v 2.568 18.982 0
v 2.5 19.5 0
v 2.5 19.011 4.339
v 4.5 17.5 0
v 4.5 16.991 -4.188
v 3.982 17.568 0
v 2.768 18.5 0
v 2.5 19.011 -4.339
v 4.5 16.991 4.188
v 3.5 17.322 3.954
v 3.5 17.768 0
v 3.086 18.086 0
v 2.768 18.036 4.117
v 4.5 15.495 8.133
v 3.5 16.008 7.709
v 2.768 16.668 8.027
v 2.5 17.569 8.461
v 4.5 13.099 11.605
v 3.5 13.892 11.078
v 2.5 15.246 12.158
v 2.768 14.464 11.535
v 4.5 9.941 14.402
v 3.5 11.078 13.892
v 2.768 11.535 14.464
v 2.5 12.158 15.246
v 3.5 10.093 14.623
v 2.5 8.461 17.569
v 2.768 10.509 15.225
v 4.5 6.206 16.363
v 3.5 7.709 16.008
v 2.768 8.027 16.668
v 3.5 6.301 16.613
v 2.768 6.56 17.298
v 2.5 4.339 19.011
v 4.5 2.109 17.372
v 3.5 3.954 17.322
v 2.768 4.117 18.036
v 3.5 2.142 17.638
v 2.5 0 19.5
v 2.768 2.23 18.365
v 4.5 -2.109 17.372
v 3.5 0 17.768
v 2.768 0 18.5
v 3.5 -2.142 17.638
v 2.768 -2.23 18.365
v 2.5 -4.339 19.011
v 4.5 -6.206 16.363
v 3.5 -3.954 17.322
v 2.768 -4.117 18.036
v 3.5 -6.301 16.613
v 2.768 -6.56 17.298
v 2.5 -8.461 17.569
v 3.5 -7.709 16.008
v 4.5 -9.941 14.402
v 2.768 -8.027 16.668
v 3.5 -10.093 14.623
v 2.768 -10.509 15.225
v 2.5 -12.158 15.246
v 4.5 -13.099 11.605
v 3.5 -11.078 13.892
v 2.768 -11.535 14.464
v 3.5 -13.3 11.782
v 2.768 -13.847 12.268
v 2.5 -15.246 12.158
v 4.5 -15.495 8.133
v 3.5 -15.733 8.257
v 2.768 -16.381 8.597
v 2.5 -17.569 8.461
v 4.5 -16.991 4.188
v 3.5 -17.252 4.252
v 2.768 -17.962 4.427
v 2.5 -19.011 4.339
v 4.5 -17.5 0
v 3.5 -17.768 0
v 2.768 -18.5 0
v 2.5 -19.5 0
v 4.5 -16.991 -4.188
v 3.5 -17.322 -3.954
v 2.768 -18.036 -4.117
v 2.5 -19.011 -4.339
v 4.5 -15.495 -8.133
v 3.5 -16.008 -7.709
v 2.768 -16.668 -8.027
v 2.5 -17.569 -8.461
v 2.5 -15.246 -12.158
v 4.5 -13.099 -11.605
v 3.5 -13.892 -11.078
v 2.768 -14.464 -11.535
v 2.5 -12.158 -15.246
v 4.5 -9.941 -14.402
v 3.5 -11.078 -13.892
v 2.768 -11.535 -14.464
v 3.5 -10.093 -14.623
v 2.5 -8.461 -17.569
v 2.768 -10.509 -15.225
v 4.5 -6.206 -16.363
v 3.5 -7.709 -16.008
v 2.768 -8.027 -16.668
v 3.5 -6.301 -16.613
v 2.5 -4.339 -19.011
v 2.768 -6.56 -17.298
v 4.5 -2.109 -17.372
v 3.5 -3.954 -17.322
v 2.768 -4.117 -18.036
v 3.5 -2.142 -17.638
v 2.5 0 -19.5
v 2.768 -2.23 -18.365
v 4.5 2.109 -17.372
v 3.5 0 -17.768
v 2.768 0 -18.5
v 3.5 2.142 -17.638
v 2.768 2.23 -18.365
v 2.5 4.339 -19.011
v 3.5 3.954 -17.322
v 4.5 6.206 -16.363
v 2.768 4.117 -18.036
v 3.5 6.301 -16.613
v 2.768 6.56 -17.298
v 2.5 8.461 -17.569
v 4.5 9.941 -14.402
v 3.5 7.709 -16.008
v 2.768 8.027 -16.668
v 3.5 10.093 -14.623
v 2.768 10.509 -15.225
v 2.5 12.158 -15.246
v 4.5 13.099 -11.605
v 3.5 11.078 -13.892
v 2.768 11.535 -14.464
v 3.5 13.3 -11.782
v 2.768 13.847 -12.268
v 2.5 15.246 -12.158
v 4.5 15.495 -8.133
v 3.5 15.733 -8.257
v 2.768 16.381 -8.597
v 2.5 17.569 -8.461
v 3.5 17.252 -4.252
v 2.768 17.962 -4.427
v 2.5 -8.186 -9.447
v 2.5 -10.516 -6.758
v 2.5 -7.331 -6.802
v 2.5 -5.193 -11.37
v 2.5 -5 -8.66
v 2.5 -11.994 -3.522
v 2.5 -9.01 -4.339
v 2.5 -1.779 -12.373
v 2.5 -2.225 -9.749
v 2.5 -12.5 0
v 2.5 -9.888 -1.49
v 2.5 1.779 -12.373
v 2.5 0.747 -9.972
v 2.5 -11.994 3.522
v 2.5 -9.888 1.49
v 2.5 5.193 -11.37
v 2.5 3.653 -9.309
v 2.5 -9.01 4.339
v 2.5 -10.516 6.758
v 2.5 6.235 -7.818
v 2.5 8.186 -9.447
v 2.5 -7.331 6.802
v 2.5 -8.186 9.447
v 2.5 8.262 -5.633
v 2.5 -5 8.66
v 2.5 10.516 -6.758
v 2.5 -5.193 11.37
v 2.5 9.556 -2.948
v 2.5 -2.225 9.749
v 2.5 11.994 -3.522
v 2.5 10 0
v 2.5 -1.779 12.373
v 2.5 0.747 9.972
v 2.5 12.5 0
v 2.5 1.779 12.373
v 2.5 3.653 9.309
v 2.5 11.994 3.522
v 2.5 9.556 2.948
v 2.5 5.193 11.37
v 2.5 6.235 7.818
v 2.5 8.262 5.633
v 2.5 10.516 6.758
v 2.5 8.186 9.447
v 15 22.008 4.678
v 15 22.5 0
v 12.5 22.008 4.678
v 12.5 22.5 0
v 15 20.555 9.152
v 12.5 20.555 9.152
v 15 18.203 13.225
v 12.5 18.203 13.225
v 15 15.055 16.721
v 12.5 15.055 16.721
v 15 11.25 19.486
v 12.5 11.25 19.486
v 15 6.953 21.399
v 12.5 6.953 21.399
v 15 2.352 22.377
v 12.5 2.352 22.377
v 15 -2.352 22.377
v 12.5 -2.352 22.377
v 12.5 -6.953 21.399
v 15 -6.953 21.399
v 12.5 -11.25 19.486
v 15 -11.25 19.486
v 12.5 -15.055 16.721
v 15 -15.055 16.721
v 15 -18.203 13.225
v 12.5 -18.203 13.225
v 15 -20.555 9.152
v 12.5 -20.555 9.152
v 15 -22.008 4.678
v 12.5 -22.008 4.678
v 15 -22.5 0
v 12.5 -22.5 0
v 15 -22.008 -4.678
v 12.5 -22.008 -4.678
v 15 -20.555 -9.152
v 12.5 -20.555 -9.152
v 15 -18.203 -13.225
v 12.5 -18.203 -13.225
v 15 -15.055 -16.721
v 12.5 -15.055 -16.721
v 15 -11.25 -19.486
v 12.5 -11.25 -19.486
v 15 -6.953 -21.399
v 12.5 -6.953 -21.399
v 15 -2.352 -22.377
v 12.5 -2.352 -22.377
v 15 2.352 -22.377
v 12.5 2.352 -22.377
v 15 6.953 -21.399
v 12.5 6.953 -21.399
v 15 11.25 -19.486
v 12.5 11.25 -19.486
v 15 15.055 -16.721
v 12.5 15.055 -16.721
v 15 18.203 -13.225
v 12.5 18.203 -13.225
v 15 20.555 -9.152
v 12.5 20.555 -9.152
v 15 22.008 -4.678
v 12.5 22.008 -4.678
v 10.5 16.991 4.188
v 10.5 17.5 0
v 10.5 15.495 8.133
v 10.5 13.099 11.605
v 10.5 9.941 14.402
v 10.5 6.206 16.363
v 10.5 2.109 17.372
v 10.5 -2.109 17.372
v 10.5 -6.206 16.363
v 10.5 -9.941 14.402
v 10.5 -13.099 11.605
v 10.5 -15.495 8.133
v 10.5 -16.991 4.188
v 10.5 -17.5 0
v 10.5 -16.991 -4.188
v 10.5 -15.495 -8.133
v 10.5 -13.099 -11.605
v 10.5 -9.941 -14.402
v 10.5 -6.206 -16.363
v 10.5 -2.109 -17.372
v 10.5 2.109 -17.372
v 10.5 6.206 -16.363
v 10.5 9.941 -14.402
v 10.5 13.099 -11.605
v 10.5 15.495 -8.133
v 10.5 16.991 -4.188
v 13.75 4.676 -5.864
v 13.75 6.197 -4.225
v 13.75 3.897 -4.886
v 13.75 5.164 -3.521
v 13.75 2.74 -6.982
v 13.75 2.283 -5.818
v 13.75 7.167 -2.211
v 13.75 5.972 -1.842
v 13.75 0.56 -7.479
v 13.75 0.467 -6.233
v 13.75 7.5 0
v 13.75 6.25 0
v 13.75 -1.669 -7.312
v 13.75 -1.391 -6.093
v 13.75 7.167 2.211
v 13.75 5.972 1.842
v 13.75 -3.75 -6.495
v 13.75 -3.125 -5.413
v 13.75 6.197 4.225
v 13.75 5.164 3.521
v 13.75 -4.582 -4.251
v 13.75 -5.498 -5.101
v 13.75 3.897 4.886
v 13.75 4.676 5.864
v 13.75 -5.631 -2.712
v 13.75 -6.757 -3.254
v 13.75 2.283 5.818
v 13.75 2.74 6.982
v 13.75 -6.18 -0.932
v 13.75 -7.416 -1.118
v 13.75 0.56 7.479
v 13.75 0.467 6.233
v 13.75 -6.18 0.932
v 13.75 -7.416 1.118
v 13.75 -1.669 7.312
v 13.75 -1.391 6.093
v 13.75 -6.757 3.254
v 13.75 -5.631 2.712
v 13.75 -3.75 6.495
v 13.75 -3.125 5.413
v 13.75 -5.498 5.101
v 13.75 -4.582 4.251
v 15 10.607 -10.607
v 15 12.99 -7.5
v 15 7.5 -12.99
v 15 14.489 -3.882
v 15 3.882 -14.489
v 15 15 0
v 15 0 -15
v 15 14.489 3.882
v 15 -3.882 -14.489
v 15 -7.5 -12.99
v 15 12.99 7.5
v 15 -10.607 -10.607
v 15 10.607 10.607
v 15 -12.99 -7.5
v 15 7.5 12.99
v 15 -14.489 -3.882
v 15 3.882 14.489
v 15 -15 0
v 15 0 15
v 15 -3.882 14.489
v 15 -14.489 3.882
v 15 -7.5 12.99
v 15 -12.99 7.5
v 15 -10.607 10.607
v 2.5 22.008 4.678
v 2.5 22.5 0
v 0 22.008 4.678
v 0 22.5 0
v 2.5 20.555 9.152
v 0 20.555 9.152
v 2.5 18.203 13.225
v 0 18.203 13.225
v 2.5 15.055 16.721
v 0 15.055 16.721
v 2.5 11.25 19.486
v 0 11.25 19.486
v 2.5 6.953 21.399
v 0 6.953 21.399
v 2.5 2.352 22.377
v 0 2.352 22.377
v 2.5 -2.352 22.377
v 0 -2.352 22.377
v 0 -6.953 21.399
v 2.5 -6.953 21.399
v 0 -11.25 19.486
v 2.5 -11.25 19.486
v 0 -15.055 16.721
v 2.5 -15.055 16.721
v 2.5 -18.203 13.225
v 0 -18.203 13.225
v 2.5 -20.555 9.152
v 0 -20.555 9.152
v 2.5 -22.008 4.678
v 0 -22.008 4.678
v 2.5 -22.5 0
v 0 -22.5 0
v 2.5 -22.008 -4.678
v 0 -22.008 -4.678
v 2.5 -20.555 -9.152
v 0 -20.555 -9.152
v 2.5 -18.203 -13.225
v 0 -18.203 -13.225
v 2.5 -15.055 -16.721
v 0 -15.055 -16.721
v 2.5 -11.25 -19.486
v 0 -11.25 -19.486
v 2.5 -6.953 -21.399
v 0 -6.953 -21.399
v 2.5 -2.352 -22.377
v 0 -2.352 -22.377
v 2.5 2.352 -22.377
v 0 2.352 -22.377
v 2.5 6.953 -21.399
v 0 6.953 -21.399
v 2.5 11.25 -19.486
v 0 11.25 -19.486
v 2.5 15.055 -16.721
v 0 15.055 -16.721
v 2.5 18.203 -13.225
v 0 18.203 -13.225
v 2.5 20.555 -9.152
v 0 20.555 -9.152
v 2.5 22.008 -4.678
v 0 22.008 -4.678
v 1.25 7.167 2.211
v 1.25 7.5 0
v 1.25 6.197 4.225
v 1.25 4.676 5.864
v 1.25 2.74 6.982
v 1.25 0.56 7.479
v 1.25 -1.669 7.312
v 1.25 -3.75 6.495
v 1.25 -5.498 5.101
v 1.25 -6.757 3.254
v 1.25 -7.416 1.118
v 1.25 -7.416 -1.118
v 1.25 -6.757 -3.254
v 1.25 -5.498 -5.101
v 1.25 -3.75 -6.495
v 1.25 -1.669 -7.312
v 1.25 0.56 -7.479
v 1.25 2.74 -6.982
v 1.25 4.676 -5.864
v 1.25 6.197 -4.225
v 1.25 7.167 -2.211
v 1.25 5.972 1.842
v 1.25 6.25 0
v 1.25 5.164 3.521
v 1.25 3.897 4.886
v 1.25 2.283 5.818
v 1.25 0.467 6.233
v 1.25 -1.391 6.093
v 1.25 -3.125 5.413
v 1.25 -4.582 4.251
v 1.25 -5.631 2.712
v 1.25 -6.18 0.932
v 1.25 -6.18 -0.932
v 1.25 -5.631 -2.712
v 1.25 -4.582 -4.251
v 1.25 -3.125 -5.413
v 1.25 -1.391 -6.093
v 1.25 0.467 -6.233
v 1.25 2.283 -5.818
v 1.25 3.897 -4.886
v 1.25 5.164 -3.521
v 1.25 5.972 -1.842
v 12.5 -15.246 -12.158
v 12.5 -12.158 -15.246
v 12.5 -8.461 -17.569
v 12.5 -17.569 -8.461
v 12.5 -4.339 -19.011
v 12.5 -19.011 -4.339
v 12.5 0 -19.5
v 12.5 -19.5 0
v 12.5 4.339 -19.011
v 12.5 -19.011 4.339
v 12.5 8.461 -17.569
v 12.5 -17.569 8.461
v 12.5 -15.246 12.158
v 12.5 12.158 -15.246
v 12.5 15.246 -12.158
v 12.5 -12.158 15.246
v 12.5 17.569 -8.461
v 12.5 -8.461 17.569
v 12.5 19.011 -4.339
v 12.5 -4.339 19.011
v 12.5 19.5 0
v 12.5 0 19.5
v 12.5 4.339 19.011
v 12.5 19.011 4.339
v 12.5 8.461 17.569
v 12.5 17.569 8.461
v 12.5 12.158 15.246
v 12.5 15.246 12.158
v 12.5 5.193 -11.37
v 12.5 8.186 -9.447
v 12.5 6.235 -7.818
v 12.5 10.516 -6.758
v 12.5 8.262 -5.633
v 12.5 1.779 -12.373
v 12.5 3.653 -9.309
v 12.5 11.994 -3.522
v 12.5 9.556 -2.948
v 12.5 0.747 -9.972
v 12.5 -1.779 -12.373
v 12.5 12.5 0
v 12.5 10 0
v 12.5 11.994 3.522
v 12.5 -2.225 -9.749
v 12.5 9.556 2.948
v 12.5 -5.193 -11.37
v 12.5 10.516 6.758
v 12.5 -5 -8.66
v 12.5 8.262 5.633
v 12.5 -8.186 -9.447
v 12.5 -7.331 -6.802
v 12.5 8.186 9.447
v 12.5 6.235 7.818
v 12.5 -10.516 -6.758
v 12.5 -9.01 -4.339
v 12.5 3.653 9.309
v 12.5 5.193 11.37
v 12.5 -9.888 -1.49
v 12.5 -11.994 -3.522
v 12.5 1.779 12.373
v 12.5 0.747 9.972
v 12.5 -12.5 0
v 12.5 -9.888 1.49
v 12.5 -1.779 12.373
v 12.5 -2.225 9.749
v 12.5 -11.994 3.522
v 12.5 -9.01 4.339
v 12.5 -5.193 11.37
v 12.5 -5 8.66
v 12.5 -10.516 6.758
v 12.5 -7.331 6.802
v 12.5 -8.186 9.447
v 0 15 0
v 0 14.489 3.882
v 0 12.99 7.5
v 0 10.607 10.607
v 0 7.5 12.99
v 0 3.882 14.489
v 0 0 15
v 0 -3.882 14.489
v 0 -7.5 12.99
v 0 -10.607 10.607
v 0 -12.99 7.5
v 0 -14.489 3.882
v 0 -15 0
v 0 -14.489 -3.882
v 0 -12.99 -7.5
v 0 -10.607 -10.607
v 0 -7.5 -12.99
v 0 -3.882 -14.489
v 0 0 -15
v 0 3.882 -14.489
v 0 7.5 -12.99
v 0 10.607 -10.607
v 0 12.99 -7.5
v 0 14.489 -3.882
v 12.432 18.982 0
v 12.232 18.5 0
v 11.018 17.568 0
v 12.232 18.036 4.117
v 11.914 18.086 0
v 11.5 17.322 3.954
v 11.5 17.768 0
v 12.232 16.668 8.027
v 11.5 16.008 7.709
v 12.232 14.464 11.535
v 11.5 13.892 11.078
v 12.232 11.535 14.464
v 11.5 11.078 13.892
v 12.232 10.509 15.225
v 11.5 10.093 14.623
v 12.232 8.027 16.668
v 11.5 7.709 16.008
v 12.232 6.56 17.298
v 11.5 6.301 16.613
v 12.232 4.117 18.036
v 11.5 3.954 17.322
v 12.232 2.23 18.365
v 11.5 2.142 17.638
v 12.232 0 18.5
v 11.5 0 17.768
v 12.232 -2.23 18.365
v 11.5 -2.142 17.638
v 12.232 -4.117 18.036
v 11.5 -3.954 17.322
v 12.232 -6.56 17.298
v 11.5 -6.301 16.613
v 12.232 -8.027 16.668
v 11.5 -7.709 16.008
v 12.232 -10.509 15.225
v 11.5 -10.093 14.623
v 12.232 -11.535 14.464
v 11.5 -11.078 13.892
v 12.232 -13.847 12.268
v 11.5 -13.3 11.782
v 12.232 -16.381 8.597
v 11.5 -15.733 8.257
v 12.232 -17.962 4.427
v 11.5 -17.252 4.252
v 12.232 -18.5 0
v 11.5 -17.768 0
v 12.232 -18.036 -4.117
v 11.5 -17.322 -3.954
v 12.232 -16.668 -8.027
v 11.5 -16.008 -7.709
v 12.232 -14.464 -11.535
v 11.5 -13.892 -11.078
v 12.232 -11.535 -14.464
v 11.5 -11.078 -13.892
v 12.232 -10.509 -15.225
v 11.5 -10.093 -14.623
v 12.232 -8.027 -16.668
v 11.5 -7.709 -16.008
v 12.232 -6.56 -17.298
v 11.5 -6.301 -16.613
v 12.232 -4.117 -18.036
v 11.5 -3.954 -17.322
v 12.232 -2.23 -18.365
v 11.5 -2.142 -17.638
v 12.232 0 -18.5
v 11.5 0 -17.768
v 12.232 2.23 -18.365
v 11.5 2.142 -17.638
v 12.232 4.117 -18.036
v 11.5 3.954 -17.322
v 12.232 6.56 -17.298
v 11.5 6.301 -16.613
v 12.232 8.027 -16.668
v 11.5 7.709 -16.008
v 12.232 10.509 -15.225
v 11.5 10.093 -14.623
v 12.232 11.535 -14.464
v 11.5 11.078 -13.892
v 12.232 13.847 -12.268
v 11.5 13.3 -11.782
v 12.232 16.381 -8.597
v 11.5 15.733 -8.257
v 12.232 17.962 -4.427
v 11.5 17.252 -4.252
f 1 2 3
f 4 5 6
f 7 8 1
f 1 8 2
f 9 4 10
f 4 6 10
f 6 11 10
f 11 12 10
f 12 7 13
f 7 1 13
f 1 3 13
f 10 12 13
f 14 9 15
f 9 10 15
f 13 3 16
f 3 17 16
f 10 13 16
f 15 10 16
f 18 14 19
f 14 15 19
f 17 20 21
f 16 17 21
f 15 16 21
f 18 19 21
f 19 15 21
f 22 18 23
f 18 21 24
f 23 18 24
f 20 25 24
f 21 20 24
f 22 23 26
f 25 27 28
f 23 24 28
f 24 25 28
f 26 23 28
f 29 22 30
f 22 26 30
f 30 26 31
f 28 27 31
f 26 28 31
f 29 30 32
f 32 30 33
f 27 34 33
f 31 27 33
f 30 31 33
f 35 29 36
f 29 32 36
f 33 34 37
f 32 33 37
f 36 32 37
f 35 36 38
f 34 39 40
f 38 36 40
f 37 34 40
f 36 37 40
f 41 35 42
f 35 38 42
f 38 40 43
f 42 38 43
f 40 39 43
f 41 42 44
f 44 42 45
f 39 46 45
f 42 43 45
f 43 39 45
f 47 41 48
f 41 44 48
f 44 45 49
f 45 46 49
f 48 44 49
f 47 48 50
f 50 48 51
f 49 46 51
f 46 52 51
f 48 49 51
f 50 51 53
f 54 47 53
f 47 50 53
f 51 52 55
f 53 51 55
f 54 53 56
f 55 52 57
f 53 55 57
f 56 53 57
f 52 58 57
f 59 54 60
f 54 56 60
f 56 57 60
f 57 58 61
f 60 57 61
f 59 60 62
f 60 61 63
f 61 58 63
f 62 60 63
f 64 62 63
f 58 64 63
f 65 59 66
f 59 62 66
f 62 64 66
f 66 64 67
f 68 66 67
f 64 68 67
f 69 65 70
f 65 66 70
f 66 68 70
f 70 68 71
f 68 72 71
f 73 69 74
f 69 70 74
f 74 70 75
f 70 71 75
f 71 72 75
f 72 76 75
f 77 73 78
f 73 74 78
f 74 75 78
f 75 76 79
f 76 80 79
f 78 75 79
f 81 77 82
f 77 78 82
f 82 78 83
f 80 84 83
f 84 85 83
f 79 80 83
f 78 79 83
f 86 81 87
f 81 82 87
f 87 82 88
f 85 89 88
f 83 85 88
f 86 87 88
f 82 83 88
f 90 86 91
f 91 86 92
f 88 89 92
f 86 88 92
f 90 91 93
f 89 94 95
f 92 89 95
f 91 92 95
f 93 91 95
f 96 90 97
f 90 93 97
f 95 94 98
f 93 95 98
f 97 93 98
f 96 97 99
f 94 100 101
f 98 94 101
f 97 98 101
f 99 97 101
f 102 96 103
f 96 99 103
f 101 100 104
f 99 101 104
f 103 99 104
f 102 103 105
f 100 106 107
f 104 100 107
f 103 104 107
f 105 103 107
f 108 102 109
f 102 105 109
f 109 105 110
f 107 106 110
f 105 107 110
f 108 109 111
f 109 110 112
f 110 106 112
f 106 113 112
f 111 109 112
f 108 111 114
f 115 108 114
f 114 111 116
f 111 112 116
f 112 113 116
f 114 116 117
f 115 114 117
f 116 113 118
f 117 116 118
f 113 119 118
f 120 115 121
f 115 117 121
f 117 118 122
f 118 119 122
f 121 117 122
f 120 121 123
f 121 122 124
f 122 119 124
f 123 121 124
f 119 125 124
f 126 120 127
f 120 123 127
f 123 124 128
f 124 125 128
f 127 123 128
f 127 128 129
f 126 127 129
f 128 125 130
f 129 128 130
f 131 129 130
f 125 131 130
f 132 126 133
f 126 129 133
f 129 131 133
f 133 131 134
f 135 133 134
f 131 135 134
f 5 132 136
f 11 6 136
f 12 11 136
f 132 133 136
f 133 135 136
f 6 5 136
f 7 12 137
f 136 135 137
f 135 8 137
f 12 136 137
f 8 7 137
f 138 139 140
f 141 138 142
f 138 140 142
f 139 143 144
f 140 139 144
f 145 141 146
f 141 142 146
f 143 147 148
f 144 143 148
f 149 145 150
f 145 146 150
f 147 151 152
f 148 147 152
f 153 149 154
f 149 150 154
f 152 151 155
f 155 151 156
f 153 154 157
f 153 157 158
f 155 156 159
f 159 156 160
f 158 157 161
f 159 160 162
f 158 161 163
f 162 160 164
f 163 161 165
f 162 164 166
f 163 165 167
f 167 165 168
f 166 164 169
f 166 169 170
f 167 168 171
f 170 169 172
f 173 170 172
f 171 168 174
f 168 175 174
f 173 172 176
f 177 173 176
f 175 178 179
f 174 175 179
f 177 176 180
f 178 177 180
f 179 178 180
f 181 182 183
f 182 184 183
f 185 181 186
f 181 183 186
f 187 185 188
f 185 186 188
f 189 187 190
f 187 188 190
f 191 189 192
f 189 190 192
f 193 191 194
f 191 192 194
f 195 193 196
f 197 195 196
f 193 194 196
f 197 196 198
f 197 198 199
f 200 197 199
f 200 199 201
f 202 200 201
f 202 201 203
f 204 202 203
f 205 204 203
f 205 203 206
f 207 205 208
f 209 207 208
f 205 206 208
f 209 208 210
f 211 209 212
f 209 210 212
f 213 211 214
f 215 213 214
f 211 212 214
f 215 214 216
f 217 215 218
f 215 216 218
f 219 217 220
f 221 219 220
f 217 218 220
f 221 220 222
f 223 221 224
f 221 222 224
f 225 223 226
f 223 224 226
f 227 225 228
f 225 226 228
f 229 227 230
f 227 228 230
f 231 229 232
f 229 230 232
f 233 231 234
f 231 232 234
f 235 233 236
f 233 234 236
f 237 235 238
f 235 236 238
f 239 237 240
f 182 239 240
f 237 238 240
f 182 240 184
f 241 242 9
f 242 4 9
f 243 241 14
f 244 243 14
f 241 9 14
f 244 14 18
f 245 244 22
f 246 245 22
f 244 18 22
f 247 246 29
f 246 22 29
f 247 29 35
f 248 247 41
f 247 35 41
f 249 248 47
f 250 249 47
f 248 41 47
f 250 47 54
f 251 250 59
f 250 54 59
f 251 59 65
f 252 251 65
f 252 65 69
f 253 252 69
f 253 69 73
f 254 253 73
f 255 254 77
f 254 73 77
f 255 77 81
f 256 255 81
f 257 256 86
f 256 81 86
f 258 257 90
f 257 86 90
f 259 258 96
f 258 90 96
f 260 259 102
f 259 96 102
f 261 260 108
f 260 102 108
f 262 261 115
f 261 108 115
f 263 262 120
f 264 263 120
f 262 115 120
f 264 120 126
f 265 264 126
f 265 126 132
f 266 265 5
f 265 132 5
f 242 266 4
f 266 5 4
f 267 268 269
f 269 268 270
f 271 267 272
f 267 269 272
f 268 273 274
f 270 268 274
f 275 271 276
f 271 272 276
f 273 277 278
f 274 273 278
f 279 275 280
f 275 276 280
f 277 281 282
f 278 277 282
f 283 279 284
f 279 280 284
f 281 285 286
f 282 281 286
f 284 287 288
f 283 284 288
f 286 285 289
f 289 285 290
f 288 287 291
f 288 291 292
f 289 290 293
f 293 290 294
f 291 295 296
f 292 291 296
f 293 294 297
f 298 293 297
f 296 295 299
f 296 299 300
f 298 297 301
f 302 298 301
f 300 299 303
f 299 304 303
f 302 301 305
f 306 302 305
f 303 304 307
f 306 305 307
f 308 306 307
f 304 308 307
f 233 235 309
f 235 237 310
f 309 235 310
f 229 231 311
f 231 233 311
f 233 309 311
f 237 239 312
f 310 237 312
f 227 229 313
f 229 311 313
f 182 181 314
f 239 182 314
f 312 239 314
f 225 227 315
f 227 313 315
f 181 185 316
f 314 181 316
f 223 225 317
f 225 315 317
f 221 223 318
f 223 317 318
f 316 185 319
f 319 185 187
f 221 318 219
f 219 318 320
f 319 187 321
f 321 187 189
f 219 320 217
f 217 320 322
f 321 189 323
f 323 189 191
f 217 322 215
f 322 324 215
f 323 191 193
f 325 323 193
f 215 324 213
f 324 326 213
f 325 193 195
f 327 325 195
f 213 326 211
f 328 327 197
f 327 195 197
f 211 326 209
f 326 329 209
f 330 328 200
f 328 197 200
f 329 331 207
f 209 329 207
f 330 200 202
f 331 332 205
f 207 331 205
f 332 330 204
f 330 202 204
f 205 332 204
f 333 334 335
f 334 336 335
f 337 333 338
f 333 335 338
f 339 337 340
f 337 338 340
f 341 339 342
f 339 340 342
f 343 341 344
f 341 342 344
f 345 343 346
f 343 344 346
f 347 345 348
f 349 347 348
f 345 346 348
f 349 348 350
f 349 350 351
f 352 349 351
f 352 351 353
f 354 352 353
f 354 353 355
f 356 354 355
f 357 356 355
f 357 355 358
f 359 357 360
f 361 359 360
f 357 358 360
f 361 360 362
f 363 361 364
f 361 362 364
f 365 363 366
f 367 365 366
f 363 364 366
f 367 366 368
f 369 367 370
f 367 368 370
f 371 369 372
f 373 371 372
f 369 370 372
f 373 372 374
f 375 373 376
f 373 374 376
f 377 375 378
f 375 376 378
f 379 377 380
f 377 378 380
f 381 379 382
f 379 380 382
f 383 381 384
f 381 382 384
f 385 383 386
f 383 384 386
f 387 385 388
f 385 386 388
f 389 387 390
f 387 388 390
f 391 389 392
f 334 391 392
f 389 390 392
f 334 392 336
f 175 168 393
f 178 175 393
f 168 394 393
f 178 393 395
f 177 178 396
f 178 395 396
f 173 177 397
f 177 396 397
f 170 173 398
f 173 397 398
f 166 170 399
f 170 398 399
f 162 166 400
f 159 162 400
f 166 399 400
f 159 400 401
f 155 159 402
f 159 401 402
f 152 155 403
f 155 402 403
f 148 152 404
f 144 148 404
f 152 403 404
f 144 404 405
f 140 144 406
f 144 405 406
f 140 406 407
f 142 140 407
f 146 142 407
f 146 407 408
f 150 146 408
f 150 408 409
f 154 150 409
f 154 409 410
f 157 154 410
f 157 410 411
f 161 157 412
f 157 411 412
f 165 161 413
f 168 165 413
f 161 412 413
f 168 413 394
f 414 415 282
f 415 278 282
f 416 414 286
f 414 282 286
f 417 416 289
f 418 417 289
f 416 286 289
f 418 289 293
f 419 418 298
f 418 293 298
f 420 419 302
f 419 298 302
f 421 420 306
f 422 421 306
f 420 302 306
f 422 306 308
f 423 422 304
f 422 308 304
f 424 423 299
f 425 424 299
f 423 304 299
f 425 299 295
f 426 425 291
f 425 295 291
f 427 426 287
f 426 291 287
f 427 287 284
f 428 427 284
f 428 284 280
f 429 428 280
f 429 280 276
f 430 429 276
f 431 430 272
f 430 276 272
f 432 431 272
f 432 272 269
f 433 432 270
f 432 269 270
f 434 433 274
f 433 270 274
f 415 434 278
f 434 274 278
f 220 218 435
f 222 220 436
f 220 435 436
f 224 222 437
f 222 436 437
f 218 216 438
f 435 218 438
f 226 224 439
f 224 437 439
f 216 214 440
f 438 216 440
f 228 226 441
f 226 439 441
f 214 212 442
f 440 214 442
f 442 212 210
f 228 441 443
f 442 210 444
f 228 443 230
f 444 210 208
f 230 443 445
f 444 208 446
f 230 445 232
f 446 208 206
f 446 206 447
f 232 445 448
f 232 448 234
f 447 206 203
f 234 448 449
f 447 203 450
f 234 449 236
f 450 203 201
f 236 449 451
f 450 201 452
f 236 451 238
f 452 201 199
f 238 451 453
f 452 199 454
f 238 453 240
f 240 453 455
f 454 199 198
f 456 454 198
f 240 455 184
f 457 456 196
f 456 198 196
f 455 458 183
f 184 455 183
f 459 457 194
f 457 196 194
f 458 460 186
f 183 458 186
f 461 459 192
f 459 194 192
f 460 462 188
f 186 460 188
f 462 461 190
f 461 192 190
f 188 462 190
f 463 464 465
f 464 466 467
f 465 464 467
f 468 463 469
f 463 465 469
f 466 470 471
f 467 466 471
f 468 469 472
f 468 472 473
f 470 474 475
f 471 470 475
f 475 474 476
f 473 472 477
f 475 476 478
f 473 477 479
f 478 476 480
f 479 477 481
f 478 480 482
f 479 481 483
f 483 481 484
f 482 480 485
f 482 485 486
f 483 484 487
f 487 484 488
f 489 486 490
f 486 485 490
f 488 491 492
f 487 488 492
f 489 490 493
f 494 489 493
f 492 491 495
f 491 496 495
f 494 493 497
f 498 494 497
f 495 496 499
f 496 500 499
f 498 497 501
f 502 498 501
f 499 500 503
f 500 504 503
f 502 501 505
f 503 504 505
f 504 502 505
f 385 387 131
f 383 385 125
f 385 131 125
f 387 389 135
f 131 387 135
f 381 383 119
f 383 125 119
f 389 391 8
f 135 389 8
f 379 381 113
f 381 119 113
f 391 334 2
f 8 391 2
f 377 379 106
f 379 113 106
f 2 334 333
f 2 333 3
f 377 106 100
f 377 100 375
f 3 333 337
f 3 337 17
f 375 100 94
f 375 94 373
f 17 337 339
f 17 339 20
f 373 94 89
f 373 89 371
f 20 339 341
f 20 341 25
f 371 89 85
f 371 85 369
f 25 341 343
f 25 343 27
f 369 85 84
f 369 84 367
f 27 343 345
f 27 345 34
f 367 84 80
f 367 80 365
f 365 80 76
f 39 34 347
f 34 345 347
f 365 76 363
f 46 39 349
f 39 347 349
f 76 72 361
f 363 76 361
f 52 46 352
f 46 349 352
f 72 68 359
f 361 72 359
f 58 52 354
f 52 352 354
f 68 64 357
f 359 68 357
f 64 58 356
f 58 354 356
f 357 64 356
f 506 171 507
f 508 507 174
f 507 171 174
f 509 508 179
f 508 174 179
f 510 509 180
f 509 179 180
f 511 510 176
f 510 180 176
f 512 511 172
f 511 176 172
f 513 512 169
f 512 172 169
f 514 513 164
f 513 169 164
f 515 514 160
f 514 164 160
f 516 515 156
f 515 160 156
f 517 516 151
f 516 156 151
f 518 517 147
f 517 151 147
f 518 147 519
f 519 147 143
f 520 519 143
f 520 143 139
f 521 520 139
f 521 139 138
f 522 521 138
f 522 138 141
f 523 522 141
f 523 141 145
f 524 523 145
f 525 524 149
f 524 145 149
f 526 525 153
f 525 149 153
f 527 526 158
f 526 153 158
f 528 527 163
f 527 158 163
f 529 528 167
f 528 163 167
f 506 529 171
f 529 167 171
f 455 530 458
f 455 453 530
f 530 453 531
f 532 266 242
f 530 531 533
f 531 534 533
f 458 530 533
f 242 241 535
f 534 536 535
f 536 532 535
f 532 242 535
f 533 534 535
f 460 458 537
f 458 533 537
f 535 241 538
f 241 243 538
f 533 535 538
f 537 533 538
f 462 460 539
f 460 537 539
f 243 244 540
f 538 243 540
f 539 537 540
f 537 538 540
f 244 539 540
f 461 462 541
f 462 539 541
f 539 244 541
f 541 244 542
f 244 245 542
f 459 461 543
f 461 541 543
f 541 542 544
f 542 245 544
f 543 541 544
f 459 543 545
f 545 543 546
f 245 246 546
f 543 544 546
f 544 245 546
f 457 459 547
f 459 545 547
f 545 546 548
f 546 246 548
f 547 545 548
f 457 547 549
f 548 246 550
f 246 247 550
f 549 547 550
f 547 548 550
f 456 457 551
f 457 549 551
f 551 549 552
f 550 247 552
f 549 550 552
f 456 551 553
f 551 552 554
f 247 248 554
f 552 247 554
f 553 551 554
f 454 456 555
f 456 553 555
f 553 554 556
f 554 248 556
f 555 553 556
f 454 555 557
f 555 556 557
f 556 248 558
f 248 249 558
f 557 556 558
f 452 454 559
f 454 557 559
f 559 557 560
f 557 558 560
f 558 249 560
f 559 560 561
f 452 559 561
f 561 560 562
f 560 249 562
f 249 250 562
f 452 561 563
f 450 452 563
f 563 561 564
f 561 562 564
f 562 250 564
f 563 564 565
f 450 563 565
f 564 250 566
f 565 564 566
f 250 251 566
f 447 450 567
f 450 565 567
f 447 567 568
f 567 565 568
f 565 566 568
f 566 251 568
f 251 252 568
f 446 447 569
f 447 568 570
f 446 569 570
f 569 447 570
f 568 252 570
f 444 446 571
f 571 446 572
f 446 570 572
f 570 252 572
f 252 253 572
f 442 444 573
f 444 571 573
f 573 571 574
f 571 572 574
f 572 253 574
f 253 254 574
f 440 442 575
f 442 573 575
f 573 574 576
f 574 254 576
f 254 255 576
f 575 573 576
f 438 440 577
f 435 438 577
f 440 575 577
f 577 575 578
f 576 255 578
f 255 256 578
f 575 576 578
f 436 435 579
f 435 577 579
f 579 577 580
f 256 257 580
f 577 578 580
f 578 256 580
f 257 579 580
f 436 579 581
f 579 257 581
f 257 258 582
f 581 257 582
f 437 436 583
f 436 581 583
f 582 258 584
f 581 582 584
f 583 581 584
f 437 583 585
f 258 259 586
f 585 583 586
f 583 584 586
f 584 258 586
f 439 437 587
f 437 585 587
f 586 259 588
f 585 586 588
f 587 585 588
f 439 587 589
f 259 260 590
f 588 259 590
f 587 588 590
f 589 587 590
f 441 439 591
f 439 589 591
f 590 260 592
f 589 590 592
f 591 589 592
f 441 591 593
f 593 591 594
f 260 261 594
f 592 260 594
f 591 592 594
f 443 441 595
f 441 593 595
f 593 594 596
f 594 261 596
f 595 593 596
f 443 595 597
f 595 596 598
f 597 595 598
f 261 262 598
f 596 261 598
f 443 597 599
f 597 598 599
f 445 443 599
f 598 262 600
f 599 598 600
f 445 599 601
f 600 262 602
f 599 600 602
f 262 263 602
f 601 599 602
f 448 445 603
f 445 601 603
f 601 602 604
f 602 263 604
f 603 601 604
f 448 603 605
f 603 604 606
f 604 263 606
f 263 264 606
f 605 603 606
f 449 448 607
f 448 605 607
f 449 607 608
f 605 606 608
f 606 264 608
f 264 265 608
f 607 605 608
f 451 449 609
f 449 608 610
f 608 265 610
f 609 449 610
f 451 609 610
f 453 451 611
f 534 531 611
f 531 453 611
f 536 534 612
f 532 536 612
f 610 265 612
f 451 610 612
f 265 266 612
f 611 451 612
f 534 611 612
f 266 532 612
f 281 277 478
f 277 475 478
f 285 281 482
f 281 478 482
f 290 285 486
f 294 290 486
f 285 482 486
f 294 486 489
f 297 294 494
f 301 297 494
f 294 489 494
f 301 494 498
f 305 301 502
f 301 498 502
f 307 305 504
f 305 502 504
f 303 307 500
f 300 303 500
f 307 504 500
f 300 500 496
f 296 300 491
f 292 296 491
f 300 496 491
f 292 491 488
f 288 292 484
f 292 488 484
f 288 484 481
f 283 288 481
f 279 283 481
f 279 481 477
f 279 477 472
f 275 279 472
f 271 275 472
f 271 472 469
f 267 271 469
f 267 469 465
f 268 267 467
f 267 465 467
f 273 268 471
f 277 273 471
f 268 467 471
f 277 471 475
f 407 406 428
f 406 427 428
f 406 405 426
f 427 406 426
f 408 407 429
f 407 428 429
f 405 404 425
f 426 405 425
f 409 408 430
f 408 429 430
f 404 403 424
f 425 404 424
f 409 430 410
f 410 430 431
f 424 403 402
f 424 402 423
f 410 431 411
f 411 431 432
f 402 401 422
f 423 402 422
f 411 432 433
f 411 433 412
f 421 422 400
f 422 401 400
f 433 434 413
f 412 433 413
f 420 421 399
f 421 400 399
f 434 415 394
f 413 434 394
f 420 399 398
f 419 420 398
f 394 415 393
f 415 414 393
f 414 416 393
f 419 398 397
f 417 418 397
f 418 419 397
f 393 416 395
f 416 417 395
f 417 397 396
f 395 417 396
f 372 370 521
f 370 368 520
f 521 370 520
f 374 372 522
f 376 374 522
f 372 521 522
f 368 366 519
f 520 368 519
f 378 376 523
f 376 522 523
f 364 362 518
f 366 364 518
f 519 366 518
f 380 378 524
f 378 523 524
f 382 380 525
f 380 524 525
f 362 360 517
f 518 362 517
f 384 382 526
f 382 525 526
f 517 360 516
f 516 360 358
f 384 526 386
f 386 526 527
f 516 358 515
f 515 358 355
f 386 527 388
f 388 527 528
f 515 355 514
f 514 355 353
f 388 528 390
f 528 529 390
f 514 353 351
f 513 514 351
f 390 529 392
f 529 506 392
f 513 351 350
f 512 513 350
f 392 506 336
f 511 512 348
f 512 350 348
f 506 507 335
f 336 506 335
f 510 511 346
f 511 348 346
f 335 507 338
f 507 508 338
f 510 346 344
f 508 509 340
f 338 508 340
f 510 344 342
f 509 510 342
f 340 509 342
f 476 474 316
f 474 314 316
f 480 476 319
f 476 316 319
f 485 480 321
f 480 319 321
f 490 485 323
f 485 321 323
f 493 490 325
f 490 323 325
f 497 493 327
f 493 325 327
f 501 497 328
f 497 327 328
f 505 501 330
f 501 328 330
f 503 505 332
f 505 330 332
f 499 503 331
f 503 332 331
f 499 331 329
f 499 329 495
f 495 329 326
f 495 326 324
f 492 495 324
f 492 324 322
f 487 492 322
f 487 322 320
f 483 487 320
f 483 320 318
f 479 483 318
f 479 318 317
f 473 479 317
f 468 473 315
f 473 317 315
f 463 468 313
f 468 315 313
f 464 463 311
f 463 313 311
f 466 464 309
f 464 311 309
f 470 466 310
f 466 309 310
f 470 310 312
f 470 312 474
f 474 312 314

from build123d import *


with BuildPart() as part:
    # Esboço2 → Revolução1 (revolve)
    with BuildSketch(Plane.XY):
        with BuildLine():
            Line((1.25, 6.25), (13.75, 6.25))
            Line((13.75, 6.25), (13.75, 7.5))
            Line((13.75, 7.5), (12.5, 10))
            Line((12.5, 10), (12.5, 12.5))
            Line((12.5, 12.5), (15, 15))
            Line((15, 15), (15, 22.5))
            Line((15, 22.5), (12.5, 22.5))
            Line((12.5, 22.5), (12.5, 19.5))
            ThreePointArc((12.5, 19.5), (11.914213562, 18.085786438), (10.5, 17.5))
            Line((10.5, 17.5), (4.5, 17.5))
            ThreePointArc((4.5, 17.5), (3.085786438, 18.085786438), (2.5, 19.5))
            Line((2.5, 19.5), (2.5, 22.5))
            Line((2.5, 22.5), (0, 22.5))
            Line((0, 22.5), (0, 15))
            Line((0, 15), (2.5, 12.5))
            Line((2.5, 12.5), (2.5, 10))
            Line((2.5, 10), (1.25, 7.5))
            Line((1.25, 7.5), (1.25, 6.25))
        make_face()
    revolve(axis=Axis((0, 0, 0), (1, 0, 0)))


solid = part.part
